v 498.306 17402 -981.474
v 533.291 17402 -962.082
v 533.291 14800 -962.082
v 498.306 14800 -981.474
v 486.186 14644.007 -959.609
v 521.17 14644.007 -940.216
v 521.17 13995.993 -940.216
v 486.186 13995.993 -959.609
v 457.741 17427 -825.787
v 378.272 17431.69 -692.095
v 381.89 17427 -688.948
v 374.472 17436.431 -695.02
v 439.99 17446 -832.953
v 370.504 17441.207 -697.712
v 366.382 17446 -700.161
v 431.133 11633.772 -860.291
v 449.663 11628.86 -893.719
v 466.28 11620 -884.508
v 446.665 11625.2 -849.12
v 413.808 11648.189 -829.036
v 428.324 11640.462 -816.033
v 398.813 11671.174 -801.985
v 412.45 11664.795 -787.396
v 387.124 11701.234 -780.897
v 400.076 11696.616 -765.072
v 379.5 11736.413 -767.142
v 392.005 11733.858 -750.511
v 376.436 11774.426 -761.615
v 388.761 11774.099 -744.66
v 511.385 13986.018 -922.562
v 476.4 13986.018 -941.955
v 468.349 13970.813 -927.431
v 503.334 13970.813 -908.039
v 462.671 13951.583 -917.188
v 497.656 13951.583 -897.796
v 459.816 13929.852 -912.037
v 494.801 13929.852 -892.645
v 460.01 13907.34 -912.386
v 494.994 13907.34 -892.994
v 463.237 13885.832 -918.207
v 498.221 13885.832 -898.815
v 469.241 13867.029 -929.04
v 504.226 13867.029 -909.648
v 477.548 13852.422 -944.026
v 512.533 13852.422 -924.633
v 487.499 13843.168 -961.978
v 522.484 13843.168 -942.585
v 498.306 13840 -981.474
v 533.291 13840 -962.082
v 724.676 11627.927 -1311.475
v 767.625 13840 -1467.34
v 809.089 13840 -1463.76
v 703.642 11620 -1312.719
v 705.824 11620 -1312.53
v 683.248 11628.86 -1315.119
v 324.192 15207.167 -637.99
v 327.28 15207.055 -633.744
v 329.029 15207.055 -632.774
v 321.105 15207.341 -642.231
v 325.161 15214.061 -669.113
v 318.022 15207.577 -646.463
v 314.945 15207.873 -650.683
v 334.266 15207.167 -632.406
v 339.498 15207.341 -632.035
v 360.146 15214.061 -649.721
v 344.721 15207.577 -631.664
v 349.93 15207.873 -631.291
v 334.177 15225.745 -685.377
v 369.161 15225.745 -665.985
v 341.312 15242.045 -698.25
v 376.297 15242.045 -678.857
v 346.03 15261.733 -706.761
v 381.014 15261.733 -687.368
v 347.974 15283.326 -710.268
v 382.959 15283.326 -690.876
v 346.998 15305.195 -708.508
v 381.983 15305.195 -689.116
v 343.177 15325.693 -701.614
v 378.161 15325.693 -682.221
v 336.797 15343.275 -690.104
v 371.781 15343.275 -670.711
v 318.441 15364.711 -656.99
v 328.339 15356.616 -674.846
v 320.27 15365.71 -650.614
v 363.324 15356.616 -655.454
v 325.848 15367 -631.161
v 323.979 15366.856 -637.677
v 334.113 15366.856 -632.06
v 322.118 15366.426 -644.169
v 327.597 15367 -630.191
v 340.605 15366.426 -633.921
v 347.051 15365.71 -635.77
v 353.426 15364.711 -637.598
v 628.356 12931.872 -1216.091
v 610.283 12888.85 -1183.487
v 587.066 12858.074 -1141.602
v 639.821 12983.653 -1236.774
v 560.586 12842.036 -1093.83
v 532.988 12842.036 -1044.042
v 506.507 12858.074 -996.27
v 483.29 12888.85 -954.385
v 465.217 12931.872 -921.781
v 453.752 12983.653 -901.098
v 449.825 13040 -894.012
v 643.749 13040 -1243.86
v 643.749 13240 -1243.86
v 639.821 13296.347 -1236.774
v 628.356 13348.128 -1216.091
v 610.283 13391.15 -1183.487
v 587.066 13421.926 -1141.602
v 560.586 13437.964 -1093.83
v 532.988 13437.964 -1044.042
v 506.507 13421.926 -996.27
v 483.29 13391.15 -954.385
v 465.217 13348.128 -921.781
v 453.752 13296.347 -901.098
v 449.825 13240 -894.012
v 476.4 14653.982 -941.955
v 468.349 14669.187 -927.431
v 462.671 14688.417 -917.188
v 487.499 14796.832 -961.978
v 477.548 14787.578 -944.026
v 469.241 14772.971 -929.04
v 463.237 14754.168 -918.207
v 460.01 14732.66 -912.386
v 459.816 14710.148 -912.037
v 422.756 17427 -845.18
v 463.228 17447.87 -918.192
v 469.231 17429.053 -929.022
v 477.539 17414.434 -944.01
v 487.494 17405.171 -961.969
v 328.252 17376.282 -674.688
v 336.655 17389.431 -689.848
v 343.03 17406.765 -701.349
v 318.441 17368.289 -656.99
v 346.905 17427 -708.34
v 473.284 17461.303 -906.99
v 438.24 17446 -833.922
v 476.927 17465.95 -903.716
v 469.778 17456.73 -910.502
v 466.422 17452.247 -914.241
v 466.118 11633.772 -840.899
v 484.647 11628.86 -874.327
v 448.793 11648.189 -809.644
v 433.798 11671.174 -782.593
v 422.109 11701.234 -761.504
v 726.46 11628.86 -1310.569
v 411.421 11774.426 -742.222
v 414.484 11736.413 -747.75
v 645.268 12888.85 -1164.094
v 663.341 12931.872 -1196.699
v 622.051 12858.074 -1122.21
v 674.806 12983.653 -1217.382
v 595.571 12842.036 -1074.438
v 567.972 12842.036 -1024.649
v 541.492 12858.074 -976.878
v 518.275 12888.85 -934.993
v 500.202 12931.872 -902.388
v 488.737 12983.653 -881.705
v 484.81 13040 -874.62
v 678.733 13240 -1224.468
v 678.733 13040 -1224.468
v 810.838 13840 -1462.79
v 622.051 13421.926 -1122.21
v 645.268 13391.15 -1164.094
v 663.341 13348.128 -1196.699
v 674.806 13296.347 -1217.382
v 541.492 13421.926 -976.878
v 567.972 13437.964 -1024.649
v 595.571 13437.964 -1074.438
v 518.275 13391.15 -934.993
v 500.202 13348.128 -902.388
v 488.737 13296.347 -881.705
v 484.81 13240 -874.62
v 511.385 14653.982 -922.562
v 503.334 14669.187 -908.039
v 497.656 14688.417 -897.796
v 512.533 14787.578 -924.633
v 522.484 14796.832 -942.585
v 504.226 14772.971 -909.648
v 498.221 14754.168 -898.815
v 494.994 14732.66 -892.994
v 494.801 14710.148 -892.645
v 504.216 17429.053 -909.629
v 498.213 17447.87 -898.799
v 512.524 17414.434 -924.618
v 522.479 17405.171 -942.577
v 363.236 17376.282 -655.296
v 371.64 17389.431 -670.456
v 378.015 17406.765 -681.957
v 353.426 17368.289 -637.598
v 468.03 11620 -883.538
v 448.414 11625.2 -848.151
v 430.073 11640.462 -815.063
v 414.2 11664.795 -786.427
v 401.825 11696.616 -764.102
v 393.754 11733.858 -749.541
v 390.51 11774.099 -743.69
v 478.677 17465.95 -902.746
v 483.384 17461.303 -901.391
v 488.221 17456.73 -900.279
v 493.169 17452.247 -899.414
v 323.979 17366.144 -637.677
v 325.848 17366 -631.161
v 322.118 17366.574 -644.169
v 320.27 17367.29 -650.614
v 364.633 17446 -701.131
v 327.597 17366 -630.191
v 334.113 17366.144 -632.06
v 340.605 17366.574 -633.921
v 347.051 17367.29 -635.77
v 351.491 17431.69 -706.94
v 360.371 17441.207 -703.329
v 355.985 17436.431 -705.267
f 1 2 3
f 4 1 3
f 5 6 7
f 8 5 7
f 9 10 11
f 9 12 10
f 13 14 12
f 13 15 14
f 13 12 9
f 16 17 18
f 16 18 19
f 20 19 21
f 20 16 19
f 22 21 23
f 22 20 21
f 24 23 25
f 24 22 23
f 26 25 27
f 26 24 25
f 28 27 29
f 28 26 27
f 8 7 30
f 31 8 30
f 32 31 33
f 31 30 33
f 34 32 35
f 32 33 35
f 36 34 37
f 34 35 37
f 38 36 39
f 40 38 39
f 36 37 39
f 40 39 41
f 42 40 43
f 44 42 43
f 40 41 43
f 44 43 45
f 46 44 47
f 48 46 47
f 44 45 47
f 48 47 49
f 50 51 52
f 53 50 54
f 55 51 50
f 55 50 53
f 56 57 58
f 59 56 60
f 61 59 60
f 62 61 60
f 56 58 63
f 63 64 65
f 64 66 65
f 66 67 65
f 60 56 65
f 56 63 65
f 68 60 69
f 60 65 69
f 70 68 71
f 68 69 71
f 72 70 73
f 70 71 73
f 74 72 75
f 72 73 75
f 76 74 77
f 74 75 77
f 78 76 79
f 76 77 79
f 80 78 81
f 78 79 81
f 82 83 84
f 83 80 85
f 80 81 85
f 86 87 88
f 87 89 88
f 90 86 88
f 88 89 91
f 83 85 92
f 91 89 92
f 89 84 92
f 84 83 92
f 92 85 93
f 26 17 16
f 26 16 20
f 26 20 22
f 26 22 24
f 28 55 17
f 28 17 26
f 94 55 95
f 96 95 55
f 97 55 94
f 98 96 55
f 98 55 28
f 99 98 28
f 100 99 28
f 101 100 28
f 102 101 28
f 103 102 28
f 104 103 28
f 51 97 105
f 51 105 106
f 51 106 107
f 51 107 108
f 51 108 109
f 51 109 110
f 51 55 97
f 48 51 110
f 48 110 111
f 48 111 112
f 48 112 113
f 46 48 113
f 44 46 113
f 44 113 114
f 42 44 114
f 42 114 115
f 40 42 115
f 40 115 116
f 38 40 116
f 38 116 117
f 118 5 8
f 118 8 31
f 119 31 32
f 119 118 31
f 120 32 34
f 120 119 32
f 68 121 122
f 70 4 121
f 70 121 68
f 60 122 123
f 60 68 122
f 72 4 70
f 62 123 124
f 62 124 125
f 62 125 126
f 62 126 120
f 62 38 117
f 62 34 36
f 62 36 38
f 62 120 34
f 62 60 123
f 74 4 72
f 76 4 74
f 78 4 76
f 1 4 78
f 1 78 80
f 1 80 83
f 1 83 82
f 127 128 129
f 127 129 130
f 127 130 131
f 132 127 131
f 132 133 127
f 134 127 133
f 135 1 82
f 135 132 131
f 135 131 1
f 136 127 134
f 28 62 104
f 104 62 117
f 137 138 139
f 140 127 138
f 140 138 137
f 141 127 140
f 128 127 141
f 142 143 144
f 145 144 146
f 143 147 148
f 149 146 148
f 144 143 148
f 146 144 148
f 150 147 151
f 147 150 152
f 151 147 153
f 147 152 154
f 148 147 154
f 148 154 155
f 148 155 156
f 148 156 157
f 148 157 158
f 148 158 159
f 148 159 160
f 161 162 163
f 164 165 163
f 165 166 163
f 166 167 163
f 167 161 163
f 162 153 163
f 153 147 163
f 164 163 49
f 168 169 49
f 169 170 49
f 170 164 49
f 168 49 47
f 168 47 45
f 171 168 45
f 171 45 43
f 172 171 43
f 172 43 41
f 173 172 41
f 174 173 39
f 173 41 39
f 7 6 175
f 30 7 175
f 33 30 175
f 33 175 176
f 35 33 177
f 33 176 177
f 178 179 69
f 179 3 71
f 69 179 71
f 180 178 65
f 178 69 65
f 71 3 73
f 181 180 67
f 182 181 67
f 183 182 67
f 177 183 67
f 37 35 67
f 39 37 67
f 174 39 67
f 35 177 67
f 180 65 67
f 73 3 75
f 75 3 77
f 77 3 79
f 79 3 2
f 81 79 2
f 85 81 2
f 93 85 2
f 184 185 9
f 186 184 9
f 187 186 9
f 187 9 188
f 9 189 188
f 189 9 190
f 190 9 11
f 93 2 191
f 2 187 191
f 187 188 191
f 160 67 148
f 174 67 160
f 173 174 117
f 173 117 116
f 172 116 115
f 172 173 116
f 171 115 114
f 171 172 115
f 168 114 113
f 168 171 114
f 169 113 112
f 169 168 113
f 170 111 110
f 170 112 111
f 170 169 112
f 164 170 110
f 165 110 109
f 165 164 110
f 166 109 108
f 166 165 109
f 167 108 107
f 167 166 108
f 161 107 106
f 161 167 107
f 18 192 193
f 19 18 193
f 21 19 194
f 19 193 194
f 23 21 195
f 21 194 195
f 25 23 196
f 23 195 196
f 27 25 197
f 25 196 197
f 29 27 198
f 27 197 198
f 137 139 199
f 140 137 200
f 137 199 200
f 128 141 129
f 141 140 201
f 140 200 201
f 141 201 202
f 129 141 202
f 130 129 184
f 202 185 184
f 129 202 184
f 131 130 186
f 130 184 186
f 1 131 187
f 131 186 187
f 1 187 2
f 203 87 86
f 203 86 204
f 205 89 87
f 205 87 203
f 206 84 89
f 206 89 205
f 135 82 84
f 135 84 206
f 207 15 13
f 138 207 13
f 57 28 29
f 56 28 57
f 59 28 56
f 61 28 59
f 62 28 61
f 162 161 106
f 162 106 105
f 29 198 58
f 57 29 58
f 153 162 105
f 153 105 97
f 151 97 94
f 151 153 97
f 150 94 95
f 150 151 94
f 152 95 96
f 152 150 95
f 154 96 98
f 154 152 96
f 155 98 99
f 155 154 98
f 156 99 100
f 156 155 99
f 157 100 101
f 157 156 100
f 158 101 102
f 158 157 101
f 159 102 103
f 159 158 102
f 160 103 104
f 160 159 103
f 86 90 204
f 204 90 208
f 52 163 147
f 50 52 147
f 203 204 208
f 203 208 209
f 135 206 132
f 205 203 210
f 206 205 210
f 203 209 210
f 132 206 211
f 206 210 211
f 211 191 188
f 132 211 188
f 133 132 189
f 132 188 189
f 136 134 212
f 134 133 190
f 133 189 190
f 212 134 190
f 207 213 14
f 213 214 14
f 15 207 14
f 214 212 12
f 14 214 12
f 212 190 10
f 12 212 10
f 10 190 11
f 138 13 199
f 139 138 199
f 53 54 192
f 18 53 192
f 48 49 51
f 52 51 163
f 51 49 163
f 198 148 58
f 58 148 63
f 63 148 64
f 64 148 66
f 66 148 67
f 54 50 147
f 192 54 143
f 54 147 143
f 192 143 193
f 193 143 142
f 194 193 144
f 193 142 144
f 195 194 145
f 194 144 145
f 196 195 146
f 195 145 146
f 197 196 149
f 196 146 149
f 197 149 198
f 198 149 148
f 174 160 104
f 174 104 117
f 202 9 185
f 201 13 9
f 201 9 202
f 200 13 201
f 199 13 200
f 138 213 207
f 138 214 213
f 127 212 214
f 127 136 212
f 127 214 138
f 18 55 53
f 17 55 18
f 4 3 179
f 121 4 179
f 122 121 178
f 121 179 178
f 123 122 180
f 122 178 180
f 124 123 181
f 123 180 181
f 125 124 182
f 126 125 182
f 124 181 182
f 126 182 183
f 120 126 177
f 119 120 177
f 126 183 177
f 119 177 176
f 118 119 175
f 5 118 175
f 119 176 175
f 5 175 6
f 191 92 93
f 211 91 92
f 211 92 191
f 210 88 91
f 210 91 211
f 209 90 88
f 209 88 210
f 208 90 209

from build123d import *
from OCP.BRepFilletAPI import BRepFilletAPI_MakeChamfer

# Parameters (mm, degrees)
EXTRUDE1_DEPTH     = 40
CUT_EXTRUDE2_DEPTH = 17548.470493518
FASE1_SIZE         = 19
FASE1_SIZE2        = 8.859845505
FASE2_SIZE         = 19
FASE3_SIZE         = 38
FASE3_SIZE2        = 16.918690042


with BuildPart() as part:
    # Sketch2 → Extrude1 (new body)
    with BuildSketch(Plane(origin=(0, 0, 0), x_dir=(0.48480962024633806, 0, -0.8746197071393953), z_dir=(0.8746197071393953, 0, 0.48480962024633806))):
        with BuildLine():
            Line((1075, 14644.006579232), (1075, 13995.993420768))
            ThreePointArc((1075, 13995.993420768), (1021.007995147, 13907.340490954), (1100, 13840))
            Line((1100, 13840), (1672.487358177, 13840))
            Line((1672.487358177, 13840), (1497.747490562, 11620))
            Line((1497.747490562, 11620), (999.665169331, 11620))
            ThreePointArc((999.665169331, 11620), (888.632351027, 11664.79504592), (839.7690046, 11774.09855115))
            Line((839.7690046, 11774.09855115), (712.953240896, 15207.054528782))
            ThreePointArc((712.953240896, 15207.054528782), (789.986366643, 15288.476872132), (710, 15367))
            Line((710, 15367), (710, 17366))
            ThreePointArc((710, 17366), (766.568542495, 17389.431457505), (790, 17446))
            Line((790, 17446), (941.828079556, 17446))
            Line((941.828079556, 17446), (1021.626625497, 17465.949636485))
            ThreePointArc((1021.626625497, 17465.949636485), (1049.423469283, 17420.016013837), (1100, 17402))
            Line((1100, 17402), (1100, 14800))
            ThreePointArc((1100, 14800), (1021.007995147, 14732.659509046), (1075, 14644.006579232))
        make_face()
    extrude(amount=-EXTRUDE1_DEPTH)

    # Sketch4 → Cut-Extrude2 (cut, through all)
    with BuildSketch(Plane(origin=(0, 0, 0), x_dir=(0.48480962024633806, 0, -0.8746197071393953), z_dir=(0.8746197071393953, 0, 0.48480962024633806))):
        with BuildLine():
            Line((1400, 13240), (1400, 13040))
            ThreePointArc((1400, 13040), (1200, 12840), (1000, 13040))
            Line((1000, 13040), (1000, 13240))
            ThreePointArc((1000, 13240), (1200, 13440), (1400, 13240))
        make_face()
    extrude(amount=-CUT_EXTRUDE2_DEPTH, mode=Mode.SUBTRACT)

    # Fase1: one chamfer whose edges measure the first distance from different faces: ONE call of the kernel's chamfer builder (chamfer() names one face for all edges)
    fase1_edges_1 = [part.edges().sort_by_distance(p)[0] for p in [
        (605.384841621, 11620, -1092.143164601),
        (570.400053335, 11620, -1111.535549411),
    ]]
    fase1_side_1 = [part.faces().sort_by_distance(p)[0] for p in [
        (587.892447478, 11620, -1101.839357006),
    ]]
    fase1_edges_2 = [part.edges().sort_by_distance(p)[0] for p in [
        (430.81751264, 11664.79504592, -777.21536661),
        (395.832724354, 11664.79504592, -796.60775142),
    ]]
    fase1_side_2 = [part.faces().sort_by_distance(p)[0] for p in [
        (413.325118497, 11664.79504592, -786.911559015),
    ]]
    fase1_edges_3 = [part.edges().sort_by_distance(p)[0] for p in [
        (376.387341094, 13490.576539966, -679.020737812),
        (341.402552808, 13490.576539966, -698.413122622),
    ]]
    fase1_side_3 = [part.faces().sort_by_distance(p)[0] for p in [
        (358.894946951, 13490.576539966, -688.716930217),
    ]]
    fase1 = BRepFilletAPI_MakeChamfer(part.part.solid().wrapped)
    for e in fase1_edges_1:
        fase1.Add(FASE1_SIZE, FASE1_SIZE2, e.wrapped, fase1_side_1[0].wrapped)  # the first distance lies on this face
    for e in fase1_edges_2:
        fase1.Add(FASE1_SIZE, FASE1_SIZE2, e.wrapped, fase1_side_2[0].wrapped)  # the first distance lies on this face
    for e in fase1_edges_3:
        fase1.Add(FASE1_SIZE, FASE1_SIZE2, e.wrapped, fase1_side_3[0].wrapped)  # the first distance lies on this face
    add(Compound.cast(fase1.Shape()), mode=Mode.REPLACE)

    # Fase2
    fase2_edges = [part.edges().sort_by_distance(p)[0] for p in [
        (440.966076678, 17455.974818243, -878.030474367),
        (384.818668505, 17446, -776.737868688),
        (344.214830375, 16366.5, -620.979992069),
        (419.803456791, 17446, -757.345483879),
        (475.950864964, 17455.974818243, -858.638089557),
        (309.230042089, 16366.5, -640.372376879),
    ]]
    chamfer(fase2_edges, length=FASE2_SIZE)

    # Fase3
    fase3_edges = [part.edges().sort_by_distance(p)[0] for p in [
        (733.664434857, 12734.429922752, -1406.072290412),
    ]]
    fase3_side = [part.faces().sort_by_distance(p)[0] for p in [
        (751.068018003, 12732.102600682, -1396.215878727),
    ]]
    chamfer(fase3_edges, length=FASE3_SIZE, length2=FASE3_SIZE2, reference=fase3_side[0])


solid = part.part
